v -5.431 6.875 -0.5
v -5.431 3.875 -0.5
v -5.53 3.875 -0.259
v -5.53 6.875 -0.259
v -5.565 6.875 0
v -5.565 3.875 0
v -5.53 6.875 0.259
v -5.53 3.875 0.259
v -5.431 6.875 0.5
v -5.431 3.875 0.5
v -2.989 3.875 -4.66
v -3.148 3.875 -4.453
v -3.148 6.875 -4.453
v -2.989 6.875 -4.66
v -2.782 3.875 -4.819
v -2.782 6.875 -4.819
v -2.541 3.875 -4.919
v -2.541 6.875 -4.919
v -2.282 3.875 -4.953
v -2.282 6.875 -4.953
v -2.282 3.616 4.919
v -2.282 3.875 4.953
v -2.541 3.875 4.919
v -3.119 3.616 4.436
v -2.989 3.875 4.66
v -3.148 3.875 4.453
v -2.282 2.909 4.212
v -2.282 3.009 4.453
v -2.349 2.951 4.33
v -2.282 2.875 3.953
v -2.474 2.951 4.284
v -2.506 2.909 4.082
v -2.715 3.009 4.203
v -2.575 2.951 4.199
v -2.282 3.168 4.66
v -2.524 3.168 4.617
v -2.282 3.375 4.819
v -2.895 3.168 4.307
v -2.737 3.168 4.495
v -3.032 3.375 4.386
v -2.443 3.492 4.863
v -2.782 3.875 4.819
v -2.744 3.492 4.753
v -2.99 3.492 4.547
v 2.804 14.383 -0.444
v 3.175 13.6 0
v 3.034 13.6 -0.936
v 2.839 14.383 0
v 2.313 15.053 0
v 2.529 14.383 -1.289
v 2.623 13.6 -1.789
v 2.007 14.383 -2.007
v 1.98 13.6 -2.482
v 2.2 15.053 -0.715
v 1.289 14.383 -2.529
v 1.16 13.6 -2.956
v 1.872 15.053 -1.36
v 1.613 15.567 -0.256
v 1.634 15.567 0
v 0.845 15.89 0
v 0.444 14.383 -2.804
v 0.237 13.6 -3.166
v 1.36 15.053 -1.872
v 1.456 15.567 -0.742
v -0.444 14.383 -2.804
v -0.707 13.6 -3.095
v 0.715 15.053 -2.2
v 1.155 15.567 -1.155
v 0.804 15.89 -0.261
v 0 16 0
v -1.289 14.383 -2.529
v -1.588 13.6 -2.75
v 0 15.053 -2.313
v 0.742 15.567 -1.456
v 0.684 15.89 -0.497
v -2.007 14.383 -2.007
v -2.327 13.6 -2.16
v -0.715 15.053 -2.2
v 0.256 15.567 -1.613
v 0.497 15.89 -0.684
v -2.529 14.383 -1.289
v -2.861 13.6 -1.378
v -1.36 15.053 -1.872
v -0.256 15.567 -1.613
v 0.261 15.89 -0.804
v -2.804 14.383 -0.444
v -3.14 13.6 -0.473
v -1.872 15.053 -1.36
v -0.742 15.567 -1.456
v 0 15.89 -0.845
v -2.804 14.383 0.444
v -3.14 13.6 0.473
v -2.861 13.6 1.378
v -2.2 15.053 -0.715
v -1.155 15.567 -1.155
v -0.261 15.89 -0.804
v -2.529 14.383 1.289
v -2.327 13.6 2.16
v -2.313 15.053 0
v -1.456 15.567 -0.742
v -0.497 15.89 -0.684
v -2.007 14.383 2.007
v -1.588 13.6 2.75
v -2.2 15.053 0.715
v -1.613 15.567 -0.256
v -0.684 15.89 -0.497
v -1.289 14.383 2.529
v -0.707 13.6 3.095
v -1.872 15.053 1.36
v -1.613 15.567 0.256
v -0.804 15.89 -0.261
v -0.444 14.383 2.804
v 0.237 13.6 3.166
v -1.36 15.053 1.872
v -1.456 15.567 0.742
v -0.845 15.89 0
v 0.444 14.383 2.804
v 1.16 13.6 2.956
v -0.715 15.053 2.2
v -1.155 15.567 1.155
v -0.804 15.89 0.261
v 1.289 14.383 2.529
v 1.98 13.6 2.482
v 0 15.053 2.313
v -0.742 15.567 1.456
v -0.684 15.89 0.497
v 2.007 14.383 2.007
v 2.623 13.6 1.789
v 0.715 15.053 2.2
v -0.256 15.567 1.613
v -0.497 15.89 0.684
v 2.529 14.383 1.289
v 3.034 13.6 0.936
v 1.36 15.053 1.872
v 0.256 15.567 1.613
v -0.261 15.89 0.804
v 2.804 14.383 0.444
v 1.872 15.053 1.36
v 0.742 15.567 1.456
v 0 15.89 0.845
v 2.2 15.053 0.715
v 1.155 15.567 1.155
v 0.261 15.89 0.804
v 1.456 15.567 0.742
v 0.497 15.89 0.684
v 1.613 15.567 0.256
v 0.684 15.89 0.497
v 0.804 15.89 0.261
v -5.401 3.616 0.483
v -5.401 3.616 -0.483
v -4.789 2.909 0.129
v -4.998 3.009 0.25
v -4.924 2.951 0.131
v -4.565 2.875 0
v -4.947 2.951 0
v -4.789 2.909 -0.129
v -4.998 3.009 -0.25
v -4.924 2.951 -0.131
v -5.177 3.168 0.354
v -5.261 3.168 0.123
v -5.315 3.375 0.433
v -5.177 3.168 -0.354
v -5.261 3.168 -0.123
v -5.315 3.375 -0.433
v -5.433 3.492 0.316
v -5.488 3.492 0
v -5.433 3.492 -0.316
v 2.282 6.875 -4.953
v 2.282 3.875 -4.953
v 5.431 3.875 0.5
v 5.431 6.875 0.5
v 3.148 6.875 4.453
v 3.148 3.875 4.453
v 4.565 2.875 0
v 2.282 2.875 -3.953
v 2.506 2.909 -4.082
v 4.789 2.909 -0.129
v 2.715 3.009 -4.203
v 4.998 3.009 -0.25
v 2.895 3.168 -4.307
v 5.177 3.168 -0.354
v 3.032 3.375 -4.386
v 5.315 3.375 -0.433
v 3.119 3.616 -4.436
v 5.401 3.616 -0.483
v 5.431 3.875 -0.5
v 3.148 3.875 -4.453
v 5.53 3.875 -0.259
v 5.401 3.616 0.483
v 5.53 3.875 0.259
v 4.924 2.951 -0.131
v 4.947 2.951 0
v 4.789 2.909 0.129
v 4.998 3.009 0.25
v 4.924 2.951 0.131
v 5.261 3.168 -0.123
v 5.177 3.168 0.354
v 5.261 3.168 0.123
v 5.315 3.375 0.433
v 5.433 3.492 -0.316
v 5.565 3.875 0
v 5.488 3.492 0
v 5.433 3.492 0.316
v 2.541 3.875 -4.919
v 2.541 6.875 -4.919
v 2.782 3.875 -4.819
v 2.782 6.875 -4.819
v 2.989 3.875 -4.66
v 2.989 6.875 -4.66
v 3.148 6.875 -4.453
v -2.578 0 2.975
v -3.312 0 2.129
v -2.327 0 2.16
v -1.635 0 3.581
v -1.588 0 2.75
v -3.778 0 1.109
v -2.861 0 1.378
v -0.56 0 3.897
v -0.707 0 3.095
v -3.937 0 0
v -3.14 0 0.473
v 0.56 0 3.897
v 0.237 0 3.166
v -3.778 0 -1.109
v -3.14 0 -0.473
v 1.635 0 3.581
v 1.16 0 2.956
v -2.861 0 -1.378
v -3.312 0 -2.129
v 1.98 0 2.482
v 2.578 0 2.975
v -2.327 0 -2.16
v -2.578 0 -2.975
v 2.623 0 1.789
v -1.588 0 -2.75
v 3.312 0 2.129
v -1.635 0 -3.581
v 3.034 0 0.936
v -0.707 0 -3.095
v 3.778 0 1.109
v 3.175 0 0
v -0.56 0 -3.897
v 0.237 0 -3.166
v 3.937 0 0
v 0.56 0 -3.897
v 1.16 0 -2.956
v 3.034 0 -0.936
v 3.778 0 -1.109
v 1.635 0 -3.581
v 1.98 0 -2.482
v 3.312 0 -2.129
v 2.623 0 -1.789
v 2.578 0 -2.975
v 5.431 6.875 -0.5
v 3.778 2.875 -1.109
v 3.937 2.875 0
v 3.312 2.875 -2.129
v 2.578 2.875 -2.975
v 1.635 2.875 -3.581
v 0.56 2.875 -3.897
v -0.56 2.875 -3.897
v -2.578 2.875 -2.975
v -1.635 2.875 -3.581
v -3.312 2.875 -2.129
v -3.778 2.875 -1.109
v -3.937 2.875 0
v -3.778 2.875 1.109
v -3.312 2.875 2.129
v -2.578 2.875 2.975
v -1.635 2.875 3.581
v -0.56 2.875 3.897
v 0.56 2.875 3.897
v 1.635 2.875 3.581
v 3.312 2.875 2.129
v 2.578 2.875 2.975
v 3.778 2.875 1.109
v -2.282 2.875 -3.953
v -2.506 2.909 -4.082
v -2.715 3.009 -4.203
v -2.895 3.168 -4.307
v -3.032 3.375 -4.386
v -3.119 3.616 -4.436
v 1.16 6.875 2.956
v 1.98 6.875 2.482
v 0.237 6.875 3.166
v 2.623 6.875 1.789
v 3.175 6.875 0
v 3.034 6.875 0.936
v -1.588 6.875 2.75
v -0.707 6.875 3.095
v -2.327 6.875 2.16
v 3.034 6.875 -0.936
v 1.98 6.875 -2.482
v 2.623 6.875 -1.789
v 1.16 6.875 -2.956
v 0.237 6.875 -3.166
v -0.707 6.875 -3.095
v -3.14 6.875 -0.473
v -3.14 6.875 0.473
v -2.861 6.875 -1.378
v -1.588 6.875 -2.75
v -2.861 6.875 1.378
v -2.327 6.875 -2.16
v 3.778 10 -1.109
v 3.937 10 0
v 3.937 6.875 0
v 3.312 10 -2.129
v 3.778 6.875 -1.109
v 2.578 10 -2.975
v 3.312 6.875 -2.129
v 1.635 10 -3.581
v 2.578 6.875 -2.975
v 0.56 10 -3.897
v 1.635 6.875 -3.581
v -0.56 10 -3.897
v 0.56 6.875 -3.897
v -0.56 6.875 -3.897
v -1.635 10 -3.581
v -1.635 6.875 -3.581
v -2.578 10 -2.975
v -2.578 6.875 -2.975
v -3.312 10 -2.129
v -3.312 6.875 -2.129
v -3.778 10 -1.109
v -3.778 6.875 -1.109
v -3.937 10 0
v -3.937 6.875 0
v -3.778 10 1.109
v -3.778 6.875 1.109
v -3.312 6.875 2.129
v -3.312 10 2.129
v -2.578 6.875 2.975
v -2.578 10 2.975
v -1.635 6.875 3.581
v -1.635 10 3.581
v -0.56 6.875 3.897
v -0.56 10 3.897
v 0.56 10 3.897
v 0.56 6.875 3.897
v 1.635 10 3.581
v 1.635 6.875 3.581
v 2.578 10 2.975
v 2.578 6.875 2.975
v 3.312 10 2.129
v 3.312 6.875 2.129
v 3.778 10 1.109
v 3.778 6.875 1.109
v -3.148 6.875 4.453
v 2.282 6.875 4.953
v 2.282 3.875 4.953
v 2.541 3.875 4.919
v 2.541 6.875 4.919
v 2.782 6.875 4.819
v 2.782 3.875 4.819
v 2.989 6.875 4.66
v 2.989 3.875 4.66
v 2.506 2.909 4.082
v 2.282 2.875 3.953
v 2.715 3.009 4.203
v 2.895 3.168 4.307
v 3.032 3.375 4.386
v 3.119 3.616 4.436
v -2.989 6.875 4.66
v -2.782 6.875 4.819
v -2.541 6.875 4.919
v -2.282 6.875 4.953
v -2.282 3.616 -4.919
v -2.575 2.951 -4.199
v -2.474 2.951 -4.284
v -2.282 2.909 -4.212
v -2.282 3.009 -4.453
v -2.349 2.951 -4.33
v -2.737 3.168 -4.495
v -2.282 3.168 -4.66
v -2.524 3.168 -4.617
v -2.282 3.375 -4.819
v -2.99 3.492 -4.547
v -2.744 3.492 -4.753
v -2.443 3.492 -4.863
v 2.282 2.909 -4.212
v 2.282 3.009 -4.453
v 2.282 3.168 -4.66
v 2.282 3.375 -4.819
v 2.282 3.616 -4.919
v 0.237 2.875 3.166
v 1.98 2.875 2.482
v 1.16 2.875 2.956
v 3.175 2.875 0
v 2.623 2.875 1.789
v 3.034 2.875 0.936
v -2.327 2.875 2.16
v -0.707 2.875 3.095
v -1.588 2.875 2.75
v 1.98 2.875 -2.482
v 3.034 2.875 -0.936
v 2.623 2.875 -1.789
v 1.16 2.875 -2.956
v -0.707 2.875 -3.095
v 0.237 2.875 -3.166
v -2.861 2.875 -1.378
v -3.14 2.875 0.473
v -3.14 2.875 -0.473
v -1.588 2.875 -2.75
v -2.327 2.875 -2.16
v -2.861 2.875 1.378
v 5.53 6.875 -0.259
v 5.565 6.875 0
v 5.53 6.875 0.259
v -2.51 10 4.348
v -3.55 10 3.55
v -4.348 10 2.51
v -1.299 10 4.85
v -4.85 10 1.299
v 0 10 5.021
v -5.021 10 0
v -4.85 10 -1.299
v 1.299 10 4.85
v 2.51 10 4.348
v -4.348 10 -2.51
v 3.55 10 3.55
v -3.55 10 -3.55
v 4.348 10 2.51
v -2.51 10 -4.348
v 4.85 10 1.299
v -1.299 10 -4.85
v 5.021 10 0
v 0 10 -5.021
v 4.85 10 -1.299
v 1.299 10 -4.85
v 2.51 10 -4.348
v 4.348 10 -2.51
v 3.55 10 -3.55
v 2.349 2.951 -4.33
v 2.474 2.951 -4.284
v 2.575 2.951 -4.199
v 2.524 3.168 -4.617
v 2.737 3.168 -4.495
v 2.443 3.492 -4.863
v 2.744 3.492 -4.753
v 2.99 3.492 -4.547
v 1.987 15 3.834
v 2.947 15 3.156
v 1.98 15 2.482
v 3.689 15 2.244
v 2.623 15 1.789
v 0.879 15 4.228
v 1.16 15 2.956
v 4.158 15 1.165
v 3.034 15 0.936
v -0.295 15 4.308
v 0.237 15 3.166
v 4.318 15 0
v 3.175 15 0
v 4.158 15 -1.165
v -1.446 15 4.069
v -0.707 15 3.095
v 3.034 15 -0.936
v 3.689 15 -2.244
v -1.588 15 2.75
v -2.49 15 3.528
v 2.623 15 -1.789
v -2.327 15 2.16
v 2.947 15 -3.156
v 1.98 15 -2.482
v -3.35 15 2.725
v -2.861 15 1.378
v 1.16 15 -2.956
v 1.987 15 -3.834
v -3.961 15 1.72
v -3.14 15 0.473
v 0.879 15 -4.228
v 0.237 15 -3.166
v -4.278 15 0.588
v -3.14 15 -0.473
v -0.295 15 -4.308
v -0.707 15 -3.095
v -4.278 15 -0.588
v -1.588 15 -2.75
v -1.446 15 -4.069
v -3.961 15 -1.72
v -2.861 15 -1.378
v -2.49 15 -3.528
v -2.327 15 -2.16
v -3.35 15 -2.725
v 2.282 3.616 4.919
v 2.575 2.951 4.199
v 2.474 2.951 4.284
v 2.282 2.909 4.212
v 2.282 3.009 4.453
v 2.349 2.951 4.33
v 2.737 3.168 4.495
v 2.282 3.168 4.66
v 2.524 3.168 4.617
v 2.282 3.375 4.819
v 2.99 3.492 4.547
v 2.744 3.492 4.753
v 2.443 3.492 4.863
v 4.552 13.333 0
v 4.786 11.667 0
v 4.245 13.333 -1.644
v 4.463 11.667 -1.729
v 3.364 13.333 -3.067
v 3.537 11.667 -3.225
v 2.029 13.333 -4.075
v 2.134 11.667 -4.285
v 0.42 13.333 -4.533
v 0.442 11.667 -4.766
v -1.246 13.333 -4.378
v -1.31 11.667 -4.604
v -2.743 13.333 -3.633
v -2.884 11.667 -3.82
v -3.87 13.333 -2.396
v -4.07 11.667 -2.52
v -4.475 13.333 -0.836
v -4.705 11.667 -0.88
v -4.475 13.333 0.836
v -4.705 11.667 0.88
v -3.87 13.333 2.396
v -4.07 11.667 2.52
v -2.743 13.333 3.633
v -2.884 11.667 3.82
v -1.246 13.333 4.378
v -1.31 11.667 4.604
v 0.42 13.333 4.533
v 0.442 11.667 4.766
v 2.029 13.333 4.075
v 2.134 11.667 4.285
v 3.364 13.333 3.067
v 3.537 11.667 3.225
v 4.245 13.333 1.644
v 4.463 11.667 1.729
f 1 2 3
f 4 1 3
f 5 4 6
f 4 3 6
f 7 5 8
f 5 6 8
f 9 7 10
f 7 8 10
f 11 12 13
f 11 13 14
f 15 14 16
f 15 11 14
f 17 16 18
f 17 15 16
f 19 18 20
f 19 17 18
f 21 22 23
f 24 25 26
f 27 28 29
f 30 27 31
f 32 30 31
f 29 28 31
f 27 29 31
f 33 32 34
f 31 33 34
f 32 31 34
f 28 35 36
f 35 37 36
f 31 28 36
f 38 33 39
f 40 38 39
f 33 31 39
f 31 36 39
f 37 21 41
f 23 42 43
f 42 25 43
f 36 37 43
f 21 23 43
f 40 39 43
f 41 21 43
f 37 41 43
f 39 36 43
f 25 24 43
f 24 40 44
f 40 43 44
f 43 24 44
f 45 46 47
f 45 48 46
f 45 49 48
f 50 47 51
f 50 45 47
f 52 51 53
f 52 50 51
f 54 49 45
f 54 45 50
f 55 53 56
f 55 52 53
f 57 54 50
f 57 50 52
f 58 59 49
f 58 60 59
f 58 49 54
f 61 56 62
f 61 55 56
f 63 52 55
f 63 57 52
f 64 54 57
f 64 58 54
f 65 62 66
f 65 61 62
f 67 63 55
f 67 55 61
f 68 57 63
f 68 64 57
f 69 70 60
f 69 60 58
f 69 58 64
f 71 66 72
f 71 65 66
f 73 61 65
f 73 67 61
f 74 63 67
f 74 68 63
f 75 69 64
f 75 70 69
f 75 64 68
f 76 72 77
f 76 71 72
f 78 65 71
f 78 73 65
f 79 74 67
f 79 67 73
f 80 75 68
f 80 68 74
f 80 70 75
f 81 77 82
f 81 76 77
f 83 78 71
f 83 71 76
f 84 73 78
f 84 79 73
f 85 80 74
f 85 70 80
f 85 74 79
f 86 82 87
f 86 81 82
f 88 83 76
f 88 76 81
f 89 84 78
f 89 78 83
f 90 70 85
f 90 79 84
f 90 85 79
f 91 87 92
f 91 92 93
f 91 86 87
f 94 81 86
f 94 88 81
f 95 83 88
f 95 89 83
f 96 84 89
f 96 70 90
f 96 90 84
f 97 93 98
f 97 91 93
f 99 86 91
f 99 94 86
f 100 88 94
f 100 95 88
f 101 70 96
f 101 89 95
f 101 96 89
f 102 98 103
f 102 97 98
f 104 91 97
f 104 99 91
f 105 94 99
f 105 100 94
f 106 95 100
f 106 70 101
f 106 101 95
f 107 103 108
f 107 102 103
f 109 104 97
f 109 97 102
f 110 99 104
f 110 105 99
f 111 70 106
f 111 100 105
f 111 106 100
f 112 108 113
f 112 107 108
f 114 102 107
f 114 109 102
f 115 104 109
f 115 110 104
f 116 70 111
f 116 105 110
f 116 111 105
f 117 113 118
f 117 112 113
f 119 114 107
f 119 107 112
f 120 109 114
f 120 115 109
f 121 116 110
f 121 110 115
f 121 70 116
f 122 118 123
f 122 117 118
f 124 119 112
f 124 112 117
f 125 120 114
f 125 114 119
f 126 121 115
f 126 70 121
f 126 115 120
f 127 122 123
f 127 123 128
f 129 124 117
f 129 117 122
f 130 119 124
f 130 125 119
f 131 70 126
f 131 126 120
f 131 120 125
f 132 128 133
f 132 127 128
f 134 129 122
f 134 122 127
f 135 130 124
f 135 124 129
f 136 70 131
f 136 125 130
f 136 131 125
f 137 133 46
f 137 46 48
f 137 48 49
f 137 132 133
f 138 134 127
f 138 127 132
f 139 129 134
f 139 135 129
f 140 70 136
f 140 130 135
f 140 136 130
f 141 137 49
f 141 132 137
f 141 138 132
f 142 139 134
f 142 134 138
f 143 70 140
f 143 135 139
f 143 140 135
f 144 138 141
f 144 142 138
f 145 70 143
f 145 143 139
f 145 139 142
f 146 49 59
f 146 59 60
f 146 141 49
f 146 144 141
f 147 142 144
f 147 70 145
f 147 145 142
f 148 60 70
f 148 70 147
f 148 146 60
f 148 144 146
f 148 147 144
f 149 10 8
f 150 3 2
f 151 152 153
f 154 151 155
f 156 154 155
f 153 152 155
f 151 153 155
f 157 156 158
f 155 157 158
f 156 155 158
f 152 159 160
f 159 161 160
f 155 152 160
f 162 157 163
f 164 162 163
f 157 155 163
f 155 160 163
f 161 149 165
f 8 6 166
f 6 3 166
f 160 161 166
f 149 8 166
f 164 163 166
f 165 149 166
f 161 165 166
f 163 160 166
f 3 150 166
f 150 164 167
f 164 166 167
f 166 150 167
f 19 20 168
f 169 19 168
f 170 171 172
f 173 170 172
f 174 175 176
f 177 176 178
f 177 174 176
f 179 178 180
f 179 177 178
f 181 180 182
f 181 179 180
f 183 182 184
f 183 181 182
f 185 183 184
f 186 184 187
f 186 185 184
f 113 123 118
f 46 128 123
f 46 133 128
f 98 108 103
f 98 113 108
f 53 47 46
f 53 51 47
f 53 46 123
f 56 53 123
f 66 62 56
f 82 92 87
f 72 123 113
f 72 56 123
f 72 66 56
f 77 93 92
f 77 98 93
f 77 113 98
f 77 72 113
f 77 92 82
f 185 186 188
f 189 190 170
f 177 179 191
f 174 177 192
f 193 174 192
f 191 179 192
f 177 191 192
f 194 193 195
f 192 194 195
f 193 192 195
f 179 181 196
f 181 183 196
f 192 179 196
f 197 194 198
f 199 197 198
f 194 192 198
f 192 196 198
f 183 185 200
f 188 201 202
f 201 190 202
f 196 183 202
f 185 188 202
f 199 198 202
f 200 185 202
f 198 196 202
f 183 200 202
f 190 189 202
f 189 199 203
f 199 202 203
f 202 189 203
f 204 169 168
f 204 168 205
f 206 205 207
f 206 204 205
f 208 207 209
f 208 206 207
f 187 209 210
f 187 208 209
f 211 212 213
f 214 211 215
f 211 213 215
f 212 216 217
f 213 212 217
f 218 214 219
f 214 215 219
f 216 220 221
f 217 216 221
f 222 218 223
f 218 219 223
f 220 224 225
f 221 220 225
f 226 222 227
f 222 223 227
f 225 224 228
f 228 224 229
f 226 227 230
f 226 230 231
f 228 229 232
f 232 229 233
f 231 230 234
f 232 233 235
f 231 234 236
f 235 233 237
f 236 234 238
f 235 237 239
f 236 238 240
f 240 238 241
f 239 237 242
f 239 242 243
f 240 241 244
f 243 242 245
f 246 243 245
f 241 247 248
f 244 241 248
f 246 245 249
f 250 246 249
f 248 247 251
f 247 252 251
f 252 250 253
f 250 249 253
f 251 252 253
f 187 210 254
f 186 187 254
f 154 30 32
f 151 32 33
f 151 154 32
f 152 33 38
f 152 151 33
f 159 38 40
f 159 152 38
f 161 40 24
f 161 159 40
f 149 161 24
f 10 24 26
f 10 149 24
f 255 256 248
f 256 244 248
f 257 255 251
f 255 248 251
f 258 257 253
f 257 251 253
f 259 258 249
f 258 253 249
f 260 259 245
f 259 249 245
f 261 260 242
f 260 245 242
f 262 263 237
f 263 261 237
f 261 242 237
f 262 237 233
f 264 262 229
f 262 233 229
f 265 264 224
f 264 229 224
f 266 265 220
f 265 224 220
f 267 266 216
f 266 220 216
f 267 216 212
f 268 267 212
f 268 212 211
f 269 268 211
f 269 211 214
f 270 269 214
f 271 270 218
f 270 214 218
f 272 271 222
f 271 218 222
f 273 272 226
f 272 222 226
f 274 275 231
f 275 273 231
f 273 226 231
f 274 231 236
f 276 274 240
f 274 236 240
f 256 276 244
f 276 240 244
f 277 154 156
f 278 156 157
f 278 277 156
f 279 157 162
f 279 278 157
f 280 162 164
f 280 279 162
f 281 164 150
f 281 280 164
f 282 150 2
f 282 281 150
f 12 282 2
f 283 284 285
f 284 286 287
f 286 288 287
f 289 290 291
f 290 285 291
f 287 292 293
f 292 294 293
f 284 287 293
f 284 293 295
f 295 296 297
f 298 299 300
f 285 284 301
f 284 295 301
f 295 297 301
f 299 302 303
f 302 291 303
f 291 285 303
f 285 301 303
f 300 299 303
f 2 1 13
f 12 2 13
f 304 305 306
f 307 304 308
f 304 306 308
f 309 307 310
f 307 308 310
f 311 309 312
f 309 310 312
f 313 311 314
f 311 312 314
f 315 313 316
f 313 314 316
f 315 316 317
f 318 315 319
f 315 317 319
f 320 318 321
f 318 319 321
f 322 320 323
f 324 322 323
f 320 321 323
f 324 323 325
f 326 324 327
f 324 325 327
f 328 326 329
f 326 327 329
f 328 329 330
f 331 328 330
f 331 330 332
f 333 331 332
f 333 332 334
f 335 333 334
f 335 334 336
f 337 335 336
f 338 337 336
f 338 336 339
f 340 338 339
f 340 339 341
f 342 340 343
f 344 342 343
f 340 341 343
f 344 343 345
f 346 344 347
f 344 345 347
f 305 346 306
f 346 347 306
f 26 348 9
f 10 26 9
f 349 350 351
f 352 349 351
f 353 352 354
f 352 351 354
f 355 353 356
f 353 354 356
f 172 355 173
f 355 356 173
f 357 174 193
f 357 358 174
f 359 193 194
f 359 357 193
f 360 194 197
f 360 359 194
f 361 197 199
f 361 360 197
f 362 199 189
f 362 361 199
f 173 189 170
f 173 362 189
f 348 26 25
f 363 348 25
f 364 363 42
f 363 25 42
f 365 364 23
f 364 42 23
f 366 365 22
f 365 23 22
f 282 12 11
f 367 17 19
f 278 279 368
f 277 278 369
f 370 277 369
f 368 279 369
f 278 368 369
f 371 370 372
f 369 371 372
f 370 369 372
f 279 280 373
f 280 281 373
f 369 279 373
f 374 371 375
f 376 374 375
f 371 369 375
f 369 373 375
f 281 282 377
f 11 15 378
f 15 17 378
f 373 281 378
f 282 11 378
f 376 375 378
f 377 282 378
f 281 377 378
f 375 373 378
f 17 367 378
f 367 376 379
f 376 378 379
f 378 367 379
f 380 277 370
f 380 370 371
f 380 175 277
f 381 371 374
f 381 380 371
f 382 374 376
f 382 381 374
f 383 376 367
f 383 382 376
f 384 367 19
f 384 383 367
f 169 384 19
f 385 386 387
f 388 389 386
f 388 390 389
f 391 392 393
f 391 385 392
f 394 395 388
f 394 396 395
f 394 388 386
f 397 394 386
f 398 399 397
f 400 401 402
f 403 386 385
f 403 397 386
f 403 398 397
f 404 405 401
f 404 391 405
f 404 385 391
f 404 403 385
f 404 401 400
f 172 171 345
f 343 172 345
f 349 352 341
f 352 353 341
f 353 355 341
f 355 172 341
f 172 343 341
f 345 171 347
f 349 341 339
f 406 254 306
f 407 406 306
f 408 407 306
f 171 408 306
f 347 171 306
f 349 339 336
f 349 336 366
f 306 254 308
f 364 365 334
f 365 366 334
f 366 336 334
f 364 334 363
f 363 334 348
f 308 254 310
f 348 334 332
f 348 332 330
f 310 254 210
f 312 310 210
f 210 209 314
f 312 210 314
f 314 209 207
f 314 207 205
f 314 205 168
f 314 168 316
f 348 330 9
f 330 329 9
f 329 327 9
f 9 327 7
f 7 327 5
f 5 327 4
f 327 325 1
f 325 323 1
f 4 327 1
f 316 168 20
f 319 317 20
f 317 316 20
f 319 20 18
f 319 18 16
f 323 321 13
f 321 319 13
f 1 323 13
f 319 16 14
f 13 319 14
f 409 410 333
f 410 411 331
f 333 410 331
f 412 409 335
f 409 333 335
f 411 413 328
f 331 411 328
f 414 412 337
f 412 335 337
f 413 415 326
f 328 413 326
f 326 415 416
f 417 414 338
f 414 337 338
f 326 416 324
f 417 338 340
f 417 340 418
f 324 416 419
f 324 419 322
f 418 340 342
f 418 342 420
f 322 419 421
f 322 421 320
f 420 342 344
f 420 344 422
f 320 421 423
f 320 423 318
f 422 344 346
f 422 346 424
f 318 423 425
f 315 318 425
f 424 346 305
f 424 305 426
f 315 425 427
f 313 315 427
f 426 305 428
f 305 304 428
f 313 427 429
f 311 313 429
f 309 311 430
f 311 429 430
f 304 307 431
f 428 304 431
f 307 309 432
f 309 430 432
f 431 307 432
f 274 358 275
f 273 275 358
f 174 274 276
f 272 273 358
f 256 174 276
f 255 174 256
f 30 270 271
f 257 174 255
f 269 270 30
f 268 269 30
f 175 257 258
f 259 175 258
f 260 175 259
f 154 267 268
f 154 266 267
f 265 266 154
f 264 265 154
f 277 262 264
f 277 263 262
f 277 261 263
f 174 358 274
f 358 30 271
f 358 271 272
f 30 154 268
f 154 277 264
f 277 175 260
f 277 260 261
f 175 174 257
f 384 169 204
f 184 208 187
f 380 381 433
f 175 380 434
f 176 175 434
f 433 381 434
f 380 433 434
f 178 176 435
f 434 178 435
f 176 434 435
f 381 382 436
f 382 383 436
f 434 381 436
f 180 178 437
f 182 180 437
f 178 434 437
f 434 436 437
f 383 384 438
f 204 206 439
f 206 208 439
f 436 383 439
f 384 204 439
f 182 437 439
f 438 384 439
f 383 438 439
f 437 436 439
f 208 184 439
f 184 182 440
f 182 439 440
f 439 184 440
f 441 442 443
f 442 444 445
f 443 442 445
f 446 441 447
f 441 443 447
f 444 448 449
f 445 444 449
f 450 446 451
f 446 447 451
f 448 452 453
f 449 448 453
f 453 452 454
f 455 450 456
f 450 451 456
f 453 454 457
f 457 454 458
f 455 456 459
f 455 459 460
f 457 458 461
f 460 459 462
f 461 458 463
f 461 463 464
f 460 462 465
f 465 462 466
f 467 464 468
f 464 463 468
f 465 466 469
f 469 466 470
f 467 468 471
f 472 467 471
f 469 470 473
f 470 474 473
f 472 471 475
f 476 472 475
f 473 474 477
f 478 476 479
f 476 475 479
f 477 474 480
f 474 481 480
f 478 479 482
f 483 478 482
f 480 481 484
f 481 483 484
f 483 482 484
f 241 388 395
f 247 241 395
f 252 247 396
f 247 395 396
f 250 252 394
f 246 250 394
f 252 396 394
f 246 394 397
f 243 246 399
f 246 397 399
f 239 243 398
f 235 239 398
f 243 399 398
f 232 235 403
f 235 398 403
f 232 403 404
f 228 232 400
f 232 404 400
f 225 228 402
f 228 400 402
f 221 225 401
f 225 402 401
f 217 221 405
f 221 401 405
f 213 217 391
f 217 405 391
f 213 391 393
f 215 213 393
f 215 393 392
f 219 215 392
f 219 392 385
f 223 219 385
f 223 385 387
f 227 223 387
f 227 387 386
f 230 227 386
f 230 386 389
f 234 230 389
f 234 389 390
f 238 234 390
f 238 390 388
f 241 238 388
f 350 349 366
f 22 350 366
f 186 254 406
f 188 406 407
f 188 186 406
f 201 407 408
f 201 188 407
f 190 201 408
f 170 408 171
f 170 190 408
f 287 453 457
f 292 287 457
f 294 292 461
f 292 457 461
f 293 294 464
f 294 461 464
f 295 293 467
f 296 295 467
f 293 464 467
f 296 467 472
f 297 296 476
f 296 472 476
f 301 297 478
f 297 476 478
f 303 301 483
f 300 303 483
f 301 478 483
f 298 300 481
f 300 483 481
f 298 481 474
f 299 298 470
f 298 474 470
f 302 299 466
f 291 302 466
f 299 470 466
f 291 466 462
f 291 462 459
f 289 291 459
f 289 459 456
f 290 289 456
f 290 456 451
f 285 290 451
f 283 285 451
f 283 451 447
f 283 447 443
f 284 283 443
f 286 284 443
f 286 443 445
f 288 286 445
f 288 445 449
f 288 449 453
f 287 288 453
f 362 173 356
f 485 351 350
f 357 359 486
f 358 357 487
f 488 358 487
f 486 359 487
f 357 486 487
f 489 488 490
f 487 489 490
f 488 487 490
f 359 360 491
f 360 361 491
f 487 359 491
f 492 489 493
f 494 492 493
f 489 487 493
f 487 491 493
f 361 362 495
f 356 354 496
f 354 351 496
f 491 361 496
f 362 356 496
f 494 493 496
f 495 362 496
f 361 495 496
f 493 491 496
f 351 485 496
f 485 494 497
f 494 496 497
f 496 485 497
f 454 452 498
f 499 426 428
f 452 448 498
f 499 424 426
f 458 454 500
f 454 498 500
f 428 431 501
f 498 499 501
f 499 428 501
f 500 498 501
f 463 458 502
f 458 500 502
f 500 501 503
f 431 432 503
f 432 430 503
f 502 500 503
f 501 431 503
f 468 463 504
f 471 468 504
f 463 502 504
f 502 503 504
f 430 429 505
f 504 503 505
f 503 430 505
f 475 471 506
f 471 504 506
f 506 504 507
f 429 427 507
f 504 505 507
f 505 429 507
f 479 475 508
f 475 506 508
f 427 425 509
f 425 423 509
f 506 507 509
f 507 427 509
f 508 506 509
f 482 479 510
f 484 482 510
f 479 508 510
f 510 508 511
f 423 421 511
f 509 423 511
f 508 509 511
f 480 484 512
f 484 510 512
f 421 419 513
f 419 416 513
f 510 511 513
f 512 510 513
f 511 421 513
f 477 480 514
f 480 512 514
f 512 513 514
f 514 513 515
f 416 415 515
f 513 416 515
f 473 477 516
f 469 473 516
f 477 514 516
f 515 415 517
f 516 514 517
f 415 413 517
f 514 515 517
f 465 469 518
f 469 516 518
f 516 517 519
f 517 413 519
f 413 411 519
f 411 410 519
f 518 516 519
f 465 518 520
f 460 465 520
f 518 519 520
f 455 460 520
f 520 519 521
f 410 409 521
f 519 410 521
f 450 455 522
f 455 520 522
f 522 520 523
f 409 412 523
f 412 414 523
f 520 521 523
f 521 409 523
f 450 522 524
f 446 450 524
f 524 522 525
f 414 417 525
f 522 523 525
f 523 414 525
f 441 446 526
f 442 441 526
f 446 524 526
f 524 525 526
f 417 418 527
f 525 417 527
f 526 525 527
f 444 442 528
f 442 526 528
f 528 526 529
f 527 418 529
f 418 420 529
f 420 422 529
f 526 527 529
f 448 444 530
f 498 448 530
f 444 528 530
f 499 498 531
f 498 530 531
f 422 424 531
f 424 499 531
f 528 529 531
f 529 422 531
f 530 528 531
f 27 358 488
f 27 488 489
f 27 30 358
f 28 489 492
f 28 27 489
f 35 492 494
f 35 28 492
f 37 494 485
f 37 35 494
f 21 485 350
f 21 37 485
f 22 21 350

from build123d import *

# Parameters (mm, degrees)
SKETCH2_R           = 3.175
CUT_EXTRUDE1_DEPTH  = 16
BOSS_EXTRUDE1_DEPTH = 4
FILLET1_R           = 1
FILLET2_R           = 1


with BuildPart() as part:
    # Sketch1 → Revolve1 (revolve)
    with BuildSketch(Plane.XY):
        Polygon((0, 0), (0, 15), (4.318, 15), (5.020704174, 10), (3.937, 10), (3.937, 0), align=None)
    revolve(axis=Axis((0, 0, 0), (0, 1, 0)))

    # Sketch2 → Cut-Extrude1 (cut, through all)
    with BuildSketch(Plane(origin=(0, 15, 0), x_dir=(1, 0, 0), z_dir=(0, 1, 0))):
        Circle(SKETCH2_R)
    extrude(amount=-CUT_EXTRUDE1_DEPTH, mode=Mode.SUBTRACT)

    # Sketch4 → Boss-Extrude1 (add)
    with BuildSketch(Plane(origin=(0, 6.875, 0), x_dir=(-1, 0, 0), z_dir=(0, -1, 0))):
        Polygon((5.719231767, 0), (2.859615883, 4.953), (-2.859615883, 4.953), (-5.719231767, 0), (-2.859615883, -4.953), (2.859615883, -4.953), align=None)
    extrude(amount=BOSS_EXTRUDE1_DEPTH)

    # Fillet1
    fillet1_edges = [part.edges().sort_by_distance(p)[0] for p in [
        (-2.859615883, 4.875, 4.953),
        (-5.719231767, 4.875, 0),
        (-2.859615883, 4.875, -4.953),
        (2.859615883, 4.875, -4.953),
        (5.719231767, 4.875, 0),
        (2.859615883, 4.875, 4.953),
    ]]
    fillet(fillet1_edges, radius=FILLET1_R)

    # Fillet2
    fillet2_edges = [part.edges().sort_by_distance(p)[0] for p in [
        (4.289423825, 2.875, 2.4765),
        (4.289423825, 2.875, -2.4765),
        (-4.289423825, 2.875, 2.4765),
        (-4.289423825, 2.875, -2.4765),
        (0, 2.875, -4.953),
        (0, 2.875, 4.953),
        (2.782265614, 2.875, 4.819025404),
        (-2.782265614, 2.875, 4.819025404),
        (-5.564531228, 2.875, 0),
        (-2.782265614, 2.875, -4.819025404),
        (2.782265614, 2.875, -4.819025404),
        (5.564531228, 2.875, 0),
    ]]
    fillet(fillet2_edges, radius=FILLET2_R)


with BuildPart() as body_2:
    # Sketch3 → Revolve2 (revolve)
    with BuildSketch(Plane.XY):
        with BuildLine():
            Line((0, 16), (0, 13.599652711))
            Line((0, 13.599652711), (3.175, 13.599652711))
            ThreePointArc((3.175, 13.599652711), (1.990118848, 15.332380476), (0, 16))
        make_face()
    revolve(axis=Axis((0, 0, 0), (0, 1, 0)))


solid = Compound([part.part, body_2.part])
